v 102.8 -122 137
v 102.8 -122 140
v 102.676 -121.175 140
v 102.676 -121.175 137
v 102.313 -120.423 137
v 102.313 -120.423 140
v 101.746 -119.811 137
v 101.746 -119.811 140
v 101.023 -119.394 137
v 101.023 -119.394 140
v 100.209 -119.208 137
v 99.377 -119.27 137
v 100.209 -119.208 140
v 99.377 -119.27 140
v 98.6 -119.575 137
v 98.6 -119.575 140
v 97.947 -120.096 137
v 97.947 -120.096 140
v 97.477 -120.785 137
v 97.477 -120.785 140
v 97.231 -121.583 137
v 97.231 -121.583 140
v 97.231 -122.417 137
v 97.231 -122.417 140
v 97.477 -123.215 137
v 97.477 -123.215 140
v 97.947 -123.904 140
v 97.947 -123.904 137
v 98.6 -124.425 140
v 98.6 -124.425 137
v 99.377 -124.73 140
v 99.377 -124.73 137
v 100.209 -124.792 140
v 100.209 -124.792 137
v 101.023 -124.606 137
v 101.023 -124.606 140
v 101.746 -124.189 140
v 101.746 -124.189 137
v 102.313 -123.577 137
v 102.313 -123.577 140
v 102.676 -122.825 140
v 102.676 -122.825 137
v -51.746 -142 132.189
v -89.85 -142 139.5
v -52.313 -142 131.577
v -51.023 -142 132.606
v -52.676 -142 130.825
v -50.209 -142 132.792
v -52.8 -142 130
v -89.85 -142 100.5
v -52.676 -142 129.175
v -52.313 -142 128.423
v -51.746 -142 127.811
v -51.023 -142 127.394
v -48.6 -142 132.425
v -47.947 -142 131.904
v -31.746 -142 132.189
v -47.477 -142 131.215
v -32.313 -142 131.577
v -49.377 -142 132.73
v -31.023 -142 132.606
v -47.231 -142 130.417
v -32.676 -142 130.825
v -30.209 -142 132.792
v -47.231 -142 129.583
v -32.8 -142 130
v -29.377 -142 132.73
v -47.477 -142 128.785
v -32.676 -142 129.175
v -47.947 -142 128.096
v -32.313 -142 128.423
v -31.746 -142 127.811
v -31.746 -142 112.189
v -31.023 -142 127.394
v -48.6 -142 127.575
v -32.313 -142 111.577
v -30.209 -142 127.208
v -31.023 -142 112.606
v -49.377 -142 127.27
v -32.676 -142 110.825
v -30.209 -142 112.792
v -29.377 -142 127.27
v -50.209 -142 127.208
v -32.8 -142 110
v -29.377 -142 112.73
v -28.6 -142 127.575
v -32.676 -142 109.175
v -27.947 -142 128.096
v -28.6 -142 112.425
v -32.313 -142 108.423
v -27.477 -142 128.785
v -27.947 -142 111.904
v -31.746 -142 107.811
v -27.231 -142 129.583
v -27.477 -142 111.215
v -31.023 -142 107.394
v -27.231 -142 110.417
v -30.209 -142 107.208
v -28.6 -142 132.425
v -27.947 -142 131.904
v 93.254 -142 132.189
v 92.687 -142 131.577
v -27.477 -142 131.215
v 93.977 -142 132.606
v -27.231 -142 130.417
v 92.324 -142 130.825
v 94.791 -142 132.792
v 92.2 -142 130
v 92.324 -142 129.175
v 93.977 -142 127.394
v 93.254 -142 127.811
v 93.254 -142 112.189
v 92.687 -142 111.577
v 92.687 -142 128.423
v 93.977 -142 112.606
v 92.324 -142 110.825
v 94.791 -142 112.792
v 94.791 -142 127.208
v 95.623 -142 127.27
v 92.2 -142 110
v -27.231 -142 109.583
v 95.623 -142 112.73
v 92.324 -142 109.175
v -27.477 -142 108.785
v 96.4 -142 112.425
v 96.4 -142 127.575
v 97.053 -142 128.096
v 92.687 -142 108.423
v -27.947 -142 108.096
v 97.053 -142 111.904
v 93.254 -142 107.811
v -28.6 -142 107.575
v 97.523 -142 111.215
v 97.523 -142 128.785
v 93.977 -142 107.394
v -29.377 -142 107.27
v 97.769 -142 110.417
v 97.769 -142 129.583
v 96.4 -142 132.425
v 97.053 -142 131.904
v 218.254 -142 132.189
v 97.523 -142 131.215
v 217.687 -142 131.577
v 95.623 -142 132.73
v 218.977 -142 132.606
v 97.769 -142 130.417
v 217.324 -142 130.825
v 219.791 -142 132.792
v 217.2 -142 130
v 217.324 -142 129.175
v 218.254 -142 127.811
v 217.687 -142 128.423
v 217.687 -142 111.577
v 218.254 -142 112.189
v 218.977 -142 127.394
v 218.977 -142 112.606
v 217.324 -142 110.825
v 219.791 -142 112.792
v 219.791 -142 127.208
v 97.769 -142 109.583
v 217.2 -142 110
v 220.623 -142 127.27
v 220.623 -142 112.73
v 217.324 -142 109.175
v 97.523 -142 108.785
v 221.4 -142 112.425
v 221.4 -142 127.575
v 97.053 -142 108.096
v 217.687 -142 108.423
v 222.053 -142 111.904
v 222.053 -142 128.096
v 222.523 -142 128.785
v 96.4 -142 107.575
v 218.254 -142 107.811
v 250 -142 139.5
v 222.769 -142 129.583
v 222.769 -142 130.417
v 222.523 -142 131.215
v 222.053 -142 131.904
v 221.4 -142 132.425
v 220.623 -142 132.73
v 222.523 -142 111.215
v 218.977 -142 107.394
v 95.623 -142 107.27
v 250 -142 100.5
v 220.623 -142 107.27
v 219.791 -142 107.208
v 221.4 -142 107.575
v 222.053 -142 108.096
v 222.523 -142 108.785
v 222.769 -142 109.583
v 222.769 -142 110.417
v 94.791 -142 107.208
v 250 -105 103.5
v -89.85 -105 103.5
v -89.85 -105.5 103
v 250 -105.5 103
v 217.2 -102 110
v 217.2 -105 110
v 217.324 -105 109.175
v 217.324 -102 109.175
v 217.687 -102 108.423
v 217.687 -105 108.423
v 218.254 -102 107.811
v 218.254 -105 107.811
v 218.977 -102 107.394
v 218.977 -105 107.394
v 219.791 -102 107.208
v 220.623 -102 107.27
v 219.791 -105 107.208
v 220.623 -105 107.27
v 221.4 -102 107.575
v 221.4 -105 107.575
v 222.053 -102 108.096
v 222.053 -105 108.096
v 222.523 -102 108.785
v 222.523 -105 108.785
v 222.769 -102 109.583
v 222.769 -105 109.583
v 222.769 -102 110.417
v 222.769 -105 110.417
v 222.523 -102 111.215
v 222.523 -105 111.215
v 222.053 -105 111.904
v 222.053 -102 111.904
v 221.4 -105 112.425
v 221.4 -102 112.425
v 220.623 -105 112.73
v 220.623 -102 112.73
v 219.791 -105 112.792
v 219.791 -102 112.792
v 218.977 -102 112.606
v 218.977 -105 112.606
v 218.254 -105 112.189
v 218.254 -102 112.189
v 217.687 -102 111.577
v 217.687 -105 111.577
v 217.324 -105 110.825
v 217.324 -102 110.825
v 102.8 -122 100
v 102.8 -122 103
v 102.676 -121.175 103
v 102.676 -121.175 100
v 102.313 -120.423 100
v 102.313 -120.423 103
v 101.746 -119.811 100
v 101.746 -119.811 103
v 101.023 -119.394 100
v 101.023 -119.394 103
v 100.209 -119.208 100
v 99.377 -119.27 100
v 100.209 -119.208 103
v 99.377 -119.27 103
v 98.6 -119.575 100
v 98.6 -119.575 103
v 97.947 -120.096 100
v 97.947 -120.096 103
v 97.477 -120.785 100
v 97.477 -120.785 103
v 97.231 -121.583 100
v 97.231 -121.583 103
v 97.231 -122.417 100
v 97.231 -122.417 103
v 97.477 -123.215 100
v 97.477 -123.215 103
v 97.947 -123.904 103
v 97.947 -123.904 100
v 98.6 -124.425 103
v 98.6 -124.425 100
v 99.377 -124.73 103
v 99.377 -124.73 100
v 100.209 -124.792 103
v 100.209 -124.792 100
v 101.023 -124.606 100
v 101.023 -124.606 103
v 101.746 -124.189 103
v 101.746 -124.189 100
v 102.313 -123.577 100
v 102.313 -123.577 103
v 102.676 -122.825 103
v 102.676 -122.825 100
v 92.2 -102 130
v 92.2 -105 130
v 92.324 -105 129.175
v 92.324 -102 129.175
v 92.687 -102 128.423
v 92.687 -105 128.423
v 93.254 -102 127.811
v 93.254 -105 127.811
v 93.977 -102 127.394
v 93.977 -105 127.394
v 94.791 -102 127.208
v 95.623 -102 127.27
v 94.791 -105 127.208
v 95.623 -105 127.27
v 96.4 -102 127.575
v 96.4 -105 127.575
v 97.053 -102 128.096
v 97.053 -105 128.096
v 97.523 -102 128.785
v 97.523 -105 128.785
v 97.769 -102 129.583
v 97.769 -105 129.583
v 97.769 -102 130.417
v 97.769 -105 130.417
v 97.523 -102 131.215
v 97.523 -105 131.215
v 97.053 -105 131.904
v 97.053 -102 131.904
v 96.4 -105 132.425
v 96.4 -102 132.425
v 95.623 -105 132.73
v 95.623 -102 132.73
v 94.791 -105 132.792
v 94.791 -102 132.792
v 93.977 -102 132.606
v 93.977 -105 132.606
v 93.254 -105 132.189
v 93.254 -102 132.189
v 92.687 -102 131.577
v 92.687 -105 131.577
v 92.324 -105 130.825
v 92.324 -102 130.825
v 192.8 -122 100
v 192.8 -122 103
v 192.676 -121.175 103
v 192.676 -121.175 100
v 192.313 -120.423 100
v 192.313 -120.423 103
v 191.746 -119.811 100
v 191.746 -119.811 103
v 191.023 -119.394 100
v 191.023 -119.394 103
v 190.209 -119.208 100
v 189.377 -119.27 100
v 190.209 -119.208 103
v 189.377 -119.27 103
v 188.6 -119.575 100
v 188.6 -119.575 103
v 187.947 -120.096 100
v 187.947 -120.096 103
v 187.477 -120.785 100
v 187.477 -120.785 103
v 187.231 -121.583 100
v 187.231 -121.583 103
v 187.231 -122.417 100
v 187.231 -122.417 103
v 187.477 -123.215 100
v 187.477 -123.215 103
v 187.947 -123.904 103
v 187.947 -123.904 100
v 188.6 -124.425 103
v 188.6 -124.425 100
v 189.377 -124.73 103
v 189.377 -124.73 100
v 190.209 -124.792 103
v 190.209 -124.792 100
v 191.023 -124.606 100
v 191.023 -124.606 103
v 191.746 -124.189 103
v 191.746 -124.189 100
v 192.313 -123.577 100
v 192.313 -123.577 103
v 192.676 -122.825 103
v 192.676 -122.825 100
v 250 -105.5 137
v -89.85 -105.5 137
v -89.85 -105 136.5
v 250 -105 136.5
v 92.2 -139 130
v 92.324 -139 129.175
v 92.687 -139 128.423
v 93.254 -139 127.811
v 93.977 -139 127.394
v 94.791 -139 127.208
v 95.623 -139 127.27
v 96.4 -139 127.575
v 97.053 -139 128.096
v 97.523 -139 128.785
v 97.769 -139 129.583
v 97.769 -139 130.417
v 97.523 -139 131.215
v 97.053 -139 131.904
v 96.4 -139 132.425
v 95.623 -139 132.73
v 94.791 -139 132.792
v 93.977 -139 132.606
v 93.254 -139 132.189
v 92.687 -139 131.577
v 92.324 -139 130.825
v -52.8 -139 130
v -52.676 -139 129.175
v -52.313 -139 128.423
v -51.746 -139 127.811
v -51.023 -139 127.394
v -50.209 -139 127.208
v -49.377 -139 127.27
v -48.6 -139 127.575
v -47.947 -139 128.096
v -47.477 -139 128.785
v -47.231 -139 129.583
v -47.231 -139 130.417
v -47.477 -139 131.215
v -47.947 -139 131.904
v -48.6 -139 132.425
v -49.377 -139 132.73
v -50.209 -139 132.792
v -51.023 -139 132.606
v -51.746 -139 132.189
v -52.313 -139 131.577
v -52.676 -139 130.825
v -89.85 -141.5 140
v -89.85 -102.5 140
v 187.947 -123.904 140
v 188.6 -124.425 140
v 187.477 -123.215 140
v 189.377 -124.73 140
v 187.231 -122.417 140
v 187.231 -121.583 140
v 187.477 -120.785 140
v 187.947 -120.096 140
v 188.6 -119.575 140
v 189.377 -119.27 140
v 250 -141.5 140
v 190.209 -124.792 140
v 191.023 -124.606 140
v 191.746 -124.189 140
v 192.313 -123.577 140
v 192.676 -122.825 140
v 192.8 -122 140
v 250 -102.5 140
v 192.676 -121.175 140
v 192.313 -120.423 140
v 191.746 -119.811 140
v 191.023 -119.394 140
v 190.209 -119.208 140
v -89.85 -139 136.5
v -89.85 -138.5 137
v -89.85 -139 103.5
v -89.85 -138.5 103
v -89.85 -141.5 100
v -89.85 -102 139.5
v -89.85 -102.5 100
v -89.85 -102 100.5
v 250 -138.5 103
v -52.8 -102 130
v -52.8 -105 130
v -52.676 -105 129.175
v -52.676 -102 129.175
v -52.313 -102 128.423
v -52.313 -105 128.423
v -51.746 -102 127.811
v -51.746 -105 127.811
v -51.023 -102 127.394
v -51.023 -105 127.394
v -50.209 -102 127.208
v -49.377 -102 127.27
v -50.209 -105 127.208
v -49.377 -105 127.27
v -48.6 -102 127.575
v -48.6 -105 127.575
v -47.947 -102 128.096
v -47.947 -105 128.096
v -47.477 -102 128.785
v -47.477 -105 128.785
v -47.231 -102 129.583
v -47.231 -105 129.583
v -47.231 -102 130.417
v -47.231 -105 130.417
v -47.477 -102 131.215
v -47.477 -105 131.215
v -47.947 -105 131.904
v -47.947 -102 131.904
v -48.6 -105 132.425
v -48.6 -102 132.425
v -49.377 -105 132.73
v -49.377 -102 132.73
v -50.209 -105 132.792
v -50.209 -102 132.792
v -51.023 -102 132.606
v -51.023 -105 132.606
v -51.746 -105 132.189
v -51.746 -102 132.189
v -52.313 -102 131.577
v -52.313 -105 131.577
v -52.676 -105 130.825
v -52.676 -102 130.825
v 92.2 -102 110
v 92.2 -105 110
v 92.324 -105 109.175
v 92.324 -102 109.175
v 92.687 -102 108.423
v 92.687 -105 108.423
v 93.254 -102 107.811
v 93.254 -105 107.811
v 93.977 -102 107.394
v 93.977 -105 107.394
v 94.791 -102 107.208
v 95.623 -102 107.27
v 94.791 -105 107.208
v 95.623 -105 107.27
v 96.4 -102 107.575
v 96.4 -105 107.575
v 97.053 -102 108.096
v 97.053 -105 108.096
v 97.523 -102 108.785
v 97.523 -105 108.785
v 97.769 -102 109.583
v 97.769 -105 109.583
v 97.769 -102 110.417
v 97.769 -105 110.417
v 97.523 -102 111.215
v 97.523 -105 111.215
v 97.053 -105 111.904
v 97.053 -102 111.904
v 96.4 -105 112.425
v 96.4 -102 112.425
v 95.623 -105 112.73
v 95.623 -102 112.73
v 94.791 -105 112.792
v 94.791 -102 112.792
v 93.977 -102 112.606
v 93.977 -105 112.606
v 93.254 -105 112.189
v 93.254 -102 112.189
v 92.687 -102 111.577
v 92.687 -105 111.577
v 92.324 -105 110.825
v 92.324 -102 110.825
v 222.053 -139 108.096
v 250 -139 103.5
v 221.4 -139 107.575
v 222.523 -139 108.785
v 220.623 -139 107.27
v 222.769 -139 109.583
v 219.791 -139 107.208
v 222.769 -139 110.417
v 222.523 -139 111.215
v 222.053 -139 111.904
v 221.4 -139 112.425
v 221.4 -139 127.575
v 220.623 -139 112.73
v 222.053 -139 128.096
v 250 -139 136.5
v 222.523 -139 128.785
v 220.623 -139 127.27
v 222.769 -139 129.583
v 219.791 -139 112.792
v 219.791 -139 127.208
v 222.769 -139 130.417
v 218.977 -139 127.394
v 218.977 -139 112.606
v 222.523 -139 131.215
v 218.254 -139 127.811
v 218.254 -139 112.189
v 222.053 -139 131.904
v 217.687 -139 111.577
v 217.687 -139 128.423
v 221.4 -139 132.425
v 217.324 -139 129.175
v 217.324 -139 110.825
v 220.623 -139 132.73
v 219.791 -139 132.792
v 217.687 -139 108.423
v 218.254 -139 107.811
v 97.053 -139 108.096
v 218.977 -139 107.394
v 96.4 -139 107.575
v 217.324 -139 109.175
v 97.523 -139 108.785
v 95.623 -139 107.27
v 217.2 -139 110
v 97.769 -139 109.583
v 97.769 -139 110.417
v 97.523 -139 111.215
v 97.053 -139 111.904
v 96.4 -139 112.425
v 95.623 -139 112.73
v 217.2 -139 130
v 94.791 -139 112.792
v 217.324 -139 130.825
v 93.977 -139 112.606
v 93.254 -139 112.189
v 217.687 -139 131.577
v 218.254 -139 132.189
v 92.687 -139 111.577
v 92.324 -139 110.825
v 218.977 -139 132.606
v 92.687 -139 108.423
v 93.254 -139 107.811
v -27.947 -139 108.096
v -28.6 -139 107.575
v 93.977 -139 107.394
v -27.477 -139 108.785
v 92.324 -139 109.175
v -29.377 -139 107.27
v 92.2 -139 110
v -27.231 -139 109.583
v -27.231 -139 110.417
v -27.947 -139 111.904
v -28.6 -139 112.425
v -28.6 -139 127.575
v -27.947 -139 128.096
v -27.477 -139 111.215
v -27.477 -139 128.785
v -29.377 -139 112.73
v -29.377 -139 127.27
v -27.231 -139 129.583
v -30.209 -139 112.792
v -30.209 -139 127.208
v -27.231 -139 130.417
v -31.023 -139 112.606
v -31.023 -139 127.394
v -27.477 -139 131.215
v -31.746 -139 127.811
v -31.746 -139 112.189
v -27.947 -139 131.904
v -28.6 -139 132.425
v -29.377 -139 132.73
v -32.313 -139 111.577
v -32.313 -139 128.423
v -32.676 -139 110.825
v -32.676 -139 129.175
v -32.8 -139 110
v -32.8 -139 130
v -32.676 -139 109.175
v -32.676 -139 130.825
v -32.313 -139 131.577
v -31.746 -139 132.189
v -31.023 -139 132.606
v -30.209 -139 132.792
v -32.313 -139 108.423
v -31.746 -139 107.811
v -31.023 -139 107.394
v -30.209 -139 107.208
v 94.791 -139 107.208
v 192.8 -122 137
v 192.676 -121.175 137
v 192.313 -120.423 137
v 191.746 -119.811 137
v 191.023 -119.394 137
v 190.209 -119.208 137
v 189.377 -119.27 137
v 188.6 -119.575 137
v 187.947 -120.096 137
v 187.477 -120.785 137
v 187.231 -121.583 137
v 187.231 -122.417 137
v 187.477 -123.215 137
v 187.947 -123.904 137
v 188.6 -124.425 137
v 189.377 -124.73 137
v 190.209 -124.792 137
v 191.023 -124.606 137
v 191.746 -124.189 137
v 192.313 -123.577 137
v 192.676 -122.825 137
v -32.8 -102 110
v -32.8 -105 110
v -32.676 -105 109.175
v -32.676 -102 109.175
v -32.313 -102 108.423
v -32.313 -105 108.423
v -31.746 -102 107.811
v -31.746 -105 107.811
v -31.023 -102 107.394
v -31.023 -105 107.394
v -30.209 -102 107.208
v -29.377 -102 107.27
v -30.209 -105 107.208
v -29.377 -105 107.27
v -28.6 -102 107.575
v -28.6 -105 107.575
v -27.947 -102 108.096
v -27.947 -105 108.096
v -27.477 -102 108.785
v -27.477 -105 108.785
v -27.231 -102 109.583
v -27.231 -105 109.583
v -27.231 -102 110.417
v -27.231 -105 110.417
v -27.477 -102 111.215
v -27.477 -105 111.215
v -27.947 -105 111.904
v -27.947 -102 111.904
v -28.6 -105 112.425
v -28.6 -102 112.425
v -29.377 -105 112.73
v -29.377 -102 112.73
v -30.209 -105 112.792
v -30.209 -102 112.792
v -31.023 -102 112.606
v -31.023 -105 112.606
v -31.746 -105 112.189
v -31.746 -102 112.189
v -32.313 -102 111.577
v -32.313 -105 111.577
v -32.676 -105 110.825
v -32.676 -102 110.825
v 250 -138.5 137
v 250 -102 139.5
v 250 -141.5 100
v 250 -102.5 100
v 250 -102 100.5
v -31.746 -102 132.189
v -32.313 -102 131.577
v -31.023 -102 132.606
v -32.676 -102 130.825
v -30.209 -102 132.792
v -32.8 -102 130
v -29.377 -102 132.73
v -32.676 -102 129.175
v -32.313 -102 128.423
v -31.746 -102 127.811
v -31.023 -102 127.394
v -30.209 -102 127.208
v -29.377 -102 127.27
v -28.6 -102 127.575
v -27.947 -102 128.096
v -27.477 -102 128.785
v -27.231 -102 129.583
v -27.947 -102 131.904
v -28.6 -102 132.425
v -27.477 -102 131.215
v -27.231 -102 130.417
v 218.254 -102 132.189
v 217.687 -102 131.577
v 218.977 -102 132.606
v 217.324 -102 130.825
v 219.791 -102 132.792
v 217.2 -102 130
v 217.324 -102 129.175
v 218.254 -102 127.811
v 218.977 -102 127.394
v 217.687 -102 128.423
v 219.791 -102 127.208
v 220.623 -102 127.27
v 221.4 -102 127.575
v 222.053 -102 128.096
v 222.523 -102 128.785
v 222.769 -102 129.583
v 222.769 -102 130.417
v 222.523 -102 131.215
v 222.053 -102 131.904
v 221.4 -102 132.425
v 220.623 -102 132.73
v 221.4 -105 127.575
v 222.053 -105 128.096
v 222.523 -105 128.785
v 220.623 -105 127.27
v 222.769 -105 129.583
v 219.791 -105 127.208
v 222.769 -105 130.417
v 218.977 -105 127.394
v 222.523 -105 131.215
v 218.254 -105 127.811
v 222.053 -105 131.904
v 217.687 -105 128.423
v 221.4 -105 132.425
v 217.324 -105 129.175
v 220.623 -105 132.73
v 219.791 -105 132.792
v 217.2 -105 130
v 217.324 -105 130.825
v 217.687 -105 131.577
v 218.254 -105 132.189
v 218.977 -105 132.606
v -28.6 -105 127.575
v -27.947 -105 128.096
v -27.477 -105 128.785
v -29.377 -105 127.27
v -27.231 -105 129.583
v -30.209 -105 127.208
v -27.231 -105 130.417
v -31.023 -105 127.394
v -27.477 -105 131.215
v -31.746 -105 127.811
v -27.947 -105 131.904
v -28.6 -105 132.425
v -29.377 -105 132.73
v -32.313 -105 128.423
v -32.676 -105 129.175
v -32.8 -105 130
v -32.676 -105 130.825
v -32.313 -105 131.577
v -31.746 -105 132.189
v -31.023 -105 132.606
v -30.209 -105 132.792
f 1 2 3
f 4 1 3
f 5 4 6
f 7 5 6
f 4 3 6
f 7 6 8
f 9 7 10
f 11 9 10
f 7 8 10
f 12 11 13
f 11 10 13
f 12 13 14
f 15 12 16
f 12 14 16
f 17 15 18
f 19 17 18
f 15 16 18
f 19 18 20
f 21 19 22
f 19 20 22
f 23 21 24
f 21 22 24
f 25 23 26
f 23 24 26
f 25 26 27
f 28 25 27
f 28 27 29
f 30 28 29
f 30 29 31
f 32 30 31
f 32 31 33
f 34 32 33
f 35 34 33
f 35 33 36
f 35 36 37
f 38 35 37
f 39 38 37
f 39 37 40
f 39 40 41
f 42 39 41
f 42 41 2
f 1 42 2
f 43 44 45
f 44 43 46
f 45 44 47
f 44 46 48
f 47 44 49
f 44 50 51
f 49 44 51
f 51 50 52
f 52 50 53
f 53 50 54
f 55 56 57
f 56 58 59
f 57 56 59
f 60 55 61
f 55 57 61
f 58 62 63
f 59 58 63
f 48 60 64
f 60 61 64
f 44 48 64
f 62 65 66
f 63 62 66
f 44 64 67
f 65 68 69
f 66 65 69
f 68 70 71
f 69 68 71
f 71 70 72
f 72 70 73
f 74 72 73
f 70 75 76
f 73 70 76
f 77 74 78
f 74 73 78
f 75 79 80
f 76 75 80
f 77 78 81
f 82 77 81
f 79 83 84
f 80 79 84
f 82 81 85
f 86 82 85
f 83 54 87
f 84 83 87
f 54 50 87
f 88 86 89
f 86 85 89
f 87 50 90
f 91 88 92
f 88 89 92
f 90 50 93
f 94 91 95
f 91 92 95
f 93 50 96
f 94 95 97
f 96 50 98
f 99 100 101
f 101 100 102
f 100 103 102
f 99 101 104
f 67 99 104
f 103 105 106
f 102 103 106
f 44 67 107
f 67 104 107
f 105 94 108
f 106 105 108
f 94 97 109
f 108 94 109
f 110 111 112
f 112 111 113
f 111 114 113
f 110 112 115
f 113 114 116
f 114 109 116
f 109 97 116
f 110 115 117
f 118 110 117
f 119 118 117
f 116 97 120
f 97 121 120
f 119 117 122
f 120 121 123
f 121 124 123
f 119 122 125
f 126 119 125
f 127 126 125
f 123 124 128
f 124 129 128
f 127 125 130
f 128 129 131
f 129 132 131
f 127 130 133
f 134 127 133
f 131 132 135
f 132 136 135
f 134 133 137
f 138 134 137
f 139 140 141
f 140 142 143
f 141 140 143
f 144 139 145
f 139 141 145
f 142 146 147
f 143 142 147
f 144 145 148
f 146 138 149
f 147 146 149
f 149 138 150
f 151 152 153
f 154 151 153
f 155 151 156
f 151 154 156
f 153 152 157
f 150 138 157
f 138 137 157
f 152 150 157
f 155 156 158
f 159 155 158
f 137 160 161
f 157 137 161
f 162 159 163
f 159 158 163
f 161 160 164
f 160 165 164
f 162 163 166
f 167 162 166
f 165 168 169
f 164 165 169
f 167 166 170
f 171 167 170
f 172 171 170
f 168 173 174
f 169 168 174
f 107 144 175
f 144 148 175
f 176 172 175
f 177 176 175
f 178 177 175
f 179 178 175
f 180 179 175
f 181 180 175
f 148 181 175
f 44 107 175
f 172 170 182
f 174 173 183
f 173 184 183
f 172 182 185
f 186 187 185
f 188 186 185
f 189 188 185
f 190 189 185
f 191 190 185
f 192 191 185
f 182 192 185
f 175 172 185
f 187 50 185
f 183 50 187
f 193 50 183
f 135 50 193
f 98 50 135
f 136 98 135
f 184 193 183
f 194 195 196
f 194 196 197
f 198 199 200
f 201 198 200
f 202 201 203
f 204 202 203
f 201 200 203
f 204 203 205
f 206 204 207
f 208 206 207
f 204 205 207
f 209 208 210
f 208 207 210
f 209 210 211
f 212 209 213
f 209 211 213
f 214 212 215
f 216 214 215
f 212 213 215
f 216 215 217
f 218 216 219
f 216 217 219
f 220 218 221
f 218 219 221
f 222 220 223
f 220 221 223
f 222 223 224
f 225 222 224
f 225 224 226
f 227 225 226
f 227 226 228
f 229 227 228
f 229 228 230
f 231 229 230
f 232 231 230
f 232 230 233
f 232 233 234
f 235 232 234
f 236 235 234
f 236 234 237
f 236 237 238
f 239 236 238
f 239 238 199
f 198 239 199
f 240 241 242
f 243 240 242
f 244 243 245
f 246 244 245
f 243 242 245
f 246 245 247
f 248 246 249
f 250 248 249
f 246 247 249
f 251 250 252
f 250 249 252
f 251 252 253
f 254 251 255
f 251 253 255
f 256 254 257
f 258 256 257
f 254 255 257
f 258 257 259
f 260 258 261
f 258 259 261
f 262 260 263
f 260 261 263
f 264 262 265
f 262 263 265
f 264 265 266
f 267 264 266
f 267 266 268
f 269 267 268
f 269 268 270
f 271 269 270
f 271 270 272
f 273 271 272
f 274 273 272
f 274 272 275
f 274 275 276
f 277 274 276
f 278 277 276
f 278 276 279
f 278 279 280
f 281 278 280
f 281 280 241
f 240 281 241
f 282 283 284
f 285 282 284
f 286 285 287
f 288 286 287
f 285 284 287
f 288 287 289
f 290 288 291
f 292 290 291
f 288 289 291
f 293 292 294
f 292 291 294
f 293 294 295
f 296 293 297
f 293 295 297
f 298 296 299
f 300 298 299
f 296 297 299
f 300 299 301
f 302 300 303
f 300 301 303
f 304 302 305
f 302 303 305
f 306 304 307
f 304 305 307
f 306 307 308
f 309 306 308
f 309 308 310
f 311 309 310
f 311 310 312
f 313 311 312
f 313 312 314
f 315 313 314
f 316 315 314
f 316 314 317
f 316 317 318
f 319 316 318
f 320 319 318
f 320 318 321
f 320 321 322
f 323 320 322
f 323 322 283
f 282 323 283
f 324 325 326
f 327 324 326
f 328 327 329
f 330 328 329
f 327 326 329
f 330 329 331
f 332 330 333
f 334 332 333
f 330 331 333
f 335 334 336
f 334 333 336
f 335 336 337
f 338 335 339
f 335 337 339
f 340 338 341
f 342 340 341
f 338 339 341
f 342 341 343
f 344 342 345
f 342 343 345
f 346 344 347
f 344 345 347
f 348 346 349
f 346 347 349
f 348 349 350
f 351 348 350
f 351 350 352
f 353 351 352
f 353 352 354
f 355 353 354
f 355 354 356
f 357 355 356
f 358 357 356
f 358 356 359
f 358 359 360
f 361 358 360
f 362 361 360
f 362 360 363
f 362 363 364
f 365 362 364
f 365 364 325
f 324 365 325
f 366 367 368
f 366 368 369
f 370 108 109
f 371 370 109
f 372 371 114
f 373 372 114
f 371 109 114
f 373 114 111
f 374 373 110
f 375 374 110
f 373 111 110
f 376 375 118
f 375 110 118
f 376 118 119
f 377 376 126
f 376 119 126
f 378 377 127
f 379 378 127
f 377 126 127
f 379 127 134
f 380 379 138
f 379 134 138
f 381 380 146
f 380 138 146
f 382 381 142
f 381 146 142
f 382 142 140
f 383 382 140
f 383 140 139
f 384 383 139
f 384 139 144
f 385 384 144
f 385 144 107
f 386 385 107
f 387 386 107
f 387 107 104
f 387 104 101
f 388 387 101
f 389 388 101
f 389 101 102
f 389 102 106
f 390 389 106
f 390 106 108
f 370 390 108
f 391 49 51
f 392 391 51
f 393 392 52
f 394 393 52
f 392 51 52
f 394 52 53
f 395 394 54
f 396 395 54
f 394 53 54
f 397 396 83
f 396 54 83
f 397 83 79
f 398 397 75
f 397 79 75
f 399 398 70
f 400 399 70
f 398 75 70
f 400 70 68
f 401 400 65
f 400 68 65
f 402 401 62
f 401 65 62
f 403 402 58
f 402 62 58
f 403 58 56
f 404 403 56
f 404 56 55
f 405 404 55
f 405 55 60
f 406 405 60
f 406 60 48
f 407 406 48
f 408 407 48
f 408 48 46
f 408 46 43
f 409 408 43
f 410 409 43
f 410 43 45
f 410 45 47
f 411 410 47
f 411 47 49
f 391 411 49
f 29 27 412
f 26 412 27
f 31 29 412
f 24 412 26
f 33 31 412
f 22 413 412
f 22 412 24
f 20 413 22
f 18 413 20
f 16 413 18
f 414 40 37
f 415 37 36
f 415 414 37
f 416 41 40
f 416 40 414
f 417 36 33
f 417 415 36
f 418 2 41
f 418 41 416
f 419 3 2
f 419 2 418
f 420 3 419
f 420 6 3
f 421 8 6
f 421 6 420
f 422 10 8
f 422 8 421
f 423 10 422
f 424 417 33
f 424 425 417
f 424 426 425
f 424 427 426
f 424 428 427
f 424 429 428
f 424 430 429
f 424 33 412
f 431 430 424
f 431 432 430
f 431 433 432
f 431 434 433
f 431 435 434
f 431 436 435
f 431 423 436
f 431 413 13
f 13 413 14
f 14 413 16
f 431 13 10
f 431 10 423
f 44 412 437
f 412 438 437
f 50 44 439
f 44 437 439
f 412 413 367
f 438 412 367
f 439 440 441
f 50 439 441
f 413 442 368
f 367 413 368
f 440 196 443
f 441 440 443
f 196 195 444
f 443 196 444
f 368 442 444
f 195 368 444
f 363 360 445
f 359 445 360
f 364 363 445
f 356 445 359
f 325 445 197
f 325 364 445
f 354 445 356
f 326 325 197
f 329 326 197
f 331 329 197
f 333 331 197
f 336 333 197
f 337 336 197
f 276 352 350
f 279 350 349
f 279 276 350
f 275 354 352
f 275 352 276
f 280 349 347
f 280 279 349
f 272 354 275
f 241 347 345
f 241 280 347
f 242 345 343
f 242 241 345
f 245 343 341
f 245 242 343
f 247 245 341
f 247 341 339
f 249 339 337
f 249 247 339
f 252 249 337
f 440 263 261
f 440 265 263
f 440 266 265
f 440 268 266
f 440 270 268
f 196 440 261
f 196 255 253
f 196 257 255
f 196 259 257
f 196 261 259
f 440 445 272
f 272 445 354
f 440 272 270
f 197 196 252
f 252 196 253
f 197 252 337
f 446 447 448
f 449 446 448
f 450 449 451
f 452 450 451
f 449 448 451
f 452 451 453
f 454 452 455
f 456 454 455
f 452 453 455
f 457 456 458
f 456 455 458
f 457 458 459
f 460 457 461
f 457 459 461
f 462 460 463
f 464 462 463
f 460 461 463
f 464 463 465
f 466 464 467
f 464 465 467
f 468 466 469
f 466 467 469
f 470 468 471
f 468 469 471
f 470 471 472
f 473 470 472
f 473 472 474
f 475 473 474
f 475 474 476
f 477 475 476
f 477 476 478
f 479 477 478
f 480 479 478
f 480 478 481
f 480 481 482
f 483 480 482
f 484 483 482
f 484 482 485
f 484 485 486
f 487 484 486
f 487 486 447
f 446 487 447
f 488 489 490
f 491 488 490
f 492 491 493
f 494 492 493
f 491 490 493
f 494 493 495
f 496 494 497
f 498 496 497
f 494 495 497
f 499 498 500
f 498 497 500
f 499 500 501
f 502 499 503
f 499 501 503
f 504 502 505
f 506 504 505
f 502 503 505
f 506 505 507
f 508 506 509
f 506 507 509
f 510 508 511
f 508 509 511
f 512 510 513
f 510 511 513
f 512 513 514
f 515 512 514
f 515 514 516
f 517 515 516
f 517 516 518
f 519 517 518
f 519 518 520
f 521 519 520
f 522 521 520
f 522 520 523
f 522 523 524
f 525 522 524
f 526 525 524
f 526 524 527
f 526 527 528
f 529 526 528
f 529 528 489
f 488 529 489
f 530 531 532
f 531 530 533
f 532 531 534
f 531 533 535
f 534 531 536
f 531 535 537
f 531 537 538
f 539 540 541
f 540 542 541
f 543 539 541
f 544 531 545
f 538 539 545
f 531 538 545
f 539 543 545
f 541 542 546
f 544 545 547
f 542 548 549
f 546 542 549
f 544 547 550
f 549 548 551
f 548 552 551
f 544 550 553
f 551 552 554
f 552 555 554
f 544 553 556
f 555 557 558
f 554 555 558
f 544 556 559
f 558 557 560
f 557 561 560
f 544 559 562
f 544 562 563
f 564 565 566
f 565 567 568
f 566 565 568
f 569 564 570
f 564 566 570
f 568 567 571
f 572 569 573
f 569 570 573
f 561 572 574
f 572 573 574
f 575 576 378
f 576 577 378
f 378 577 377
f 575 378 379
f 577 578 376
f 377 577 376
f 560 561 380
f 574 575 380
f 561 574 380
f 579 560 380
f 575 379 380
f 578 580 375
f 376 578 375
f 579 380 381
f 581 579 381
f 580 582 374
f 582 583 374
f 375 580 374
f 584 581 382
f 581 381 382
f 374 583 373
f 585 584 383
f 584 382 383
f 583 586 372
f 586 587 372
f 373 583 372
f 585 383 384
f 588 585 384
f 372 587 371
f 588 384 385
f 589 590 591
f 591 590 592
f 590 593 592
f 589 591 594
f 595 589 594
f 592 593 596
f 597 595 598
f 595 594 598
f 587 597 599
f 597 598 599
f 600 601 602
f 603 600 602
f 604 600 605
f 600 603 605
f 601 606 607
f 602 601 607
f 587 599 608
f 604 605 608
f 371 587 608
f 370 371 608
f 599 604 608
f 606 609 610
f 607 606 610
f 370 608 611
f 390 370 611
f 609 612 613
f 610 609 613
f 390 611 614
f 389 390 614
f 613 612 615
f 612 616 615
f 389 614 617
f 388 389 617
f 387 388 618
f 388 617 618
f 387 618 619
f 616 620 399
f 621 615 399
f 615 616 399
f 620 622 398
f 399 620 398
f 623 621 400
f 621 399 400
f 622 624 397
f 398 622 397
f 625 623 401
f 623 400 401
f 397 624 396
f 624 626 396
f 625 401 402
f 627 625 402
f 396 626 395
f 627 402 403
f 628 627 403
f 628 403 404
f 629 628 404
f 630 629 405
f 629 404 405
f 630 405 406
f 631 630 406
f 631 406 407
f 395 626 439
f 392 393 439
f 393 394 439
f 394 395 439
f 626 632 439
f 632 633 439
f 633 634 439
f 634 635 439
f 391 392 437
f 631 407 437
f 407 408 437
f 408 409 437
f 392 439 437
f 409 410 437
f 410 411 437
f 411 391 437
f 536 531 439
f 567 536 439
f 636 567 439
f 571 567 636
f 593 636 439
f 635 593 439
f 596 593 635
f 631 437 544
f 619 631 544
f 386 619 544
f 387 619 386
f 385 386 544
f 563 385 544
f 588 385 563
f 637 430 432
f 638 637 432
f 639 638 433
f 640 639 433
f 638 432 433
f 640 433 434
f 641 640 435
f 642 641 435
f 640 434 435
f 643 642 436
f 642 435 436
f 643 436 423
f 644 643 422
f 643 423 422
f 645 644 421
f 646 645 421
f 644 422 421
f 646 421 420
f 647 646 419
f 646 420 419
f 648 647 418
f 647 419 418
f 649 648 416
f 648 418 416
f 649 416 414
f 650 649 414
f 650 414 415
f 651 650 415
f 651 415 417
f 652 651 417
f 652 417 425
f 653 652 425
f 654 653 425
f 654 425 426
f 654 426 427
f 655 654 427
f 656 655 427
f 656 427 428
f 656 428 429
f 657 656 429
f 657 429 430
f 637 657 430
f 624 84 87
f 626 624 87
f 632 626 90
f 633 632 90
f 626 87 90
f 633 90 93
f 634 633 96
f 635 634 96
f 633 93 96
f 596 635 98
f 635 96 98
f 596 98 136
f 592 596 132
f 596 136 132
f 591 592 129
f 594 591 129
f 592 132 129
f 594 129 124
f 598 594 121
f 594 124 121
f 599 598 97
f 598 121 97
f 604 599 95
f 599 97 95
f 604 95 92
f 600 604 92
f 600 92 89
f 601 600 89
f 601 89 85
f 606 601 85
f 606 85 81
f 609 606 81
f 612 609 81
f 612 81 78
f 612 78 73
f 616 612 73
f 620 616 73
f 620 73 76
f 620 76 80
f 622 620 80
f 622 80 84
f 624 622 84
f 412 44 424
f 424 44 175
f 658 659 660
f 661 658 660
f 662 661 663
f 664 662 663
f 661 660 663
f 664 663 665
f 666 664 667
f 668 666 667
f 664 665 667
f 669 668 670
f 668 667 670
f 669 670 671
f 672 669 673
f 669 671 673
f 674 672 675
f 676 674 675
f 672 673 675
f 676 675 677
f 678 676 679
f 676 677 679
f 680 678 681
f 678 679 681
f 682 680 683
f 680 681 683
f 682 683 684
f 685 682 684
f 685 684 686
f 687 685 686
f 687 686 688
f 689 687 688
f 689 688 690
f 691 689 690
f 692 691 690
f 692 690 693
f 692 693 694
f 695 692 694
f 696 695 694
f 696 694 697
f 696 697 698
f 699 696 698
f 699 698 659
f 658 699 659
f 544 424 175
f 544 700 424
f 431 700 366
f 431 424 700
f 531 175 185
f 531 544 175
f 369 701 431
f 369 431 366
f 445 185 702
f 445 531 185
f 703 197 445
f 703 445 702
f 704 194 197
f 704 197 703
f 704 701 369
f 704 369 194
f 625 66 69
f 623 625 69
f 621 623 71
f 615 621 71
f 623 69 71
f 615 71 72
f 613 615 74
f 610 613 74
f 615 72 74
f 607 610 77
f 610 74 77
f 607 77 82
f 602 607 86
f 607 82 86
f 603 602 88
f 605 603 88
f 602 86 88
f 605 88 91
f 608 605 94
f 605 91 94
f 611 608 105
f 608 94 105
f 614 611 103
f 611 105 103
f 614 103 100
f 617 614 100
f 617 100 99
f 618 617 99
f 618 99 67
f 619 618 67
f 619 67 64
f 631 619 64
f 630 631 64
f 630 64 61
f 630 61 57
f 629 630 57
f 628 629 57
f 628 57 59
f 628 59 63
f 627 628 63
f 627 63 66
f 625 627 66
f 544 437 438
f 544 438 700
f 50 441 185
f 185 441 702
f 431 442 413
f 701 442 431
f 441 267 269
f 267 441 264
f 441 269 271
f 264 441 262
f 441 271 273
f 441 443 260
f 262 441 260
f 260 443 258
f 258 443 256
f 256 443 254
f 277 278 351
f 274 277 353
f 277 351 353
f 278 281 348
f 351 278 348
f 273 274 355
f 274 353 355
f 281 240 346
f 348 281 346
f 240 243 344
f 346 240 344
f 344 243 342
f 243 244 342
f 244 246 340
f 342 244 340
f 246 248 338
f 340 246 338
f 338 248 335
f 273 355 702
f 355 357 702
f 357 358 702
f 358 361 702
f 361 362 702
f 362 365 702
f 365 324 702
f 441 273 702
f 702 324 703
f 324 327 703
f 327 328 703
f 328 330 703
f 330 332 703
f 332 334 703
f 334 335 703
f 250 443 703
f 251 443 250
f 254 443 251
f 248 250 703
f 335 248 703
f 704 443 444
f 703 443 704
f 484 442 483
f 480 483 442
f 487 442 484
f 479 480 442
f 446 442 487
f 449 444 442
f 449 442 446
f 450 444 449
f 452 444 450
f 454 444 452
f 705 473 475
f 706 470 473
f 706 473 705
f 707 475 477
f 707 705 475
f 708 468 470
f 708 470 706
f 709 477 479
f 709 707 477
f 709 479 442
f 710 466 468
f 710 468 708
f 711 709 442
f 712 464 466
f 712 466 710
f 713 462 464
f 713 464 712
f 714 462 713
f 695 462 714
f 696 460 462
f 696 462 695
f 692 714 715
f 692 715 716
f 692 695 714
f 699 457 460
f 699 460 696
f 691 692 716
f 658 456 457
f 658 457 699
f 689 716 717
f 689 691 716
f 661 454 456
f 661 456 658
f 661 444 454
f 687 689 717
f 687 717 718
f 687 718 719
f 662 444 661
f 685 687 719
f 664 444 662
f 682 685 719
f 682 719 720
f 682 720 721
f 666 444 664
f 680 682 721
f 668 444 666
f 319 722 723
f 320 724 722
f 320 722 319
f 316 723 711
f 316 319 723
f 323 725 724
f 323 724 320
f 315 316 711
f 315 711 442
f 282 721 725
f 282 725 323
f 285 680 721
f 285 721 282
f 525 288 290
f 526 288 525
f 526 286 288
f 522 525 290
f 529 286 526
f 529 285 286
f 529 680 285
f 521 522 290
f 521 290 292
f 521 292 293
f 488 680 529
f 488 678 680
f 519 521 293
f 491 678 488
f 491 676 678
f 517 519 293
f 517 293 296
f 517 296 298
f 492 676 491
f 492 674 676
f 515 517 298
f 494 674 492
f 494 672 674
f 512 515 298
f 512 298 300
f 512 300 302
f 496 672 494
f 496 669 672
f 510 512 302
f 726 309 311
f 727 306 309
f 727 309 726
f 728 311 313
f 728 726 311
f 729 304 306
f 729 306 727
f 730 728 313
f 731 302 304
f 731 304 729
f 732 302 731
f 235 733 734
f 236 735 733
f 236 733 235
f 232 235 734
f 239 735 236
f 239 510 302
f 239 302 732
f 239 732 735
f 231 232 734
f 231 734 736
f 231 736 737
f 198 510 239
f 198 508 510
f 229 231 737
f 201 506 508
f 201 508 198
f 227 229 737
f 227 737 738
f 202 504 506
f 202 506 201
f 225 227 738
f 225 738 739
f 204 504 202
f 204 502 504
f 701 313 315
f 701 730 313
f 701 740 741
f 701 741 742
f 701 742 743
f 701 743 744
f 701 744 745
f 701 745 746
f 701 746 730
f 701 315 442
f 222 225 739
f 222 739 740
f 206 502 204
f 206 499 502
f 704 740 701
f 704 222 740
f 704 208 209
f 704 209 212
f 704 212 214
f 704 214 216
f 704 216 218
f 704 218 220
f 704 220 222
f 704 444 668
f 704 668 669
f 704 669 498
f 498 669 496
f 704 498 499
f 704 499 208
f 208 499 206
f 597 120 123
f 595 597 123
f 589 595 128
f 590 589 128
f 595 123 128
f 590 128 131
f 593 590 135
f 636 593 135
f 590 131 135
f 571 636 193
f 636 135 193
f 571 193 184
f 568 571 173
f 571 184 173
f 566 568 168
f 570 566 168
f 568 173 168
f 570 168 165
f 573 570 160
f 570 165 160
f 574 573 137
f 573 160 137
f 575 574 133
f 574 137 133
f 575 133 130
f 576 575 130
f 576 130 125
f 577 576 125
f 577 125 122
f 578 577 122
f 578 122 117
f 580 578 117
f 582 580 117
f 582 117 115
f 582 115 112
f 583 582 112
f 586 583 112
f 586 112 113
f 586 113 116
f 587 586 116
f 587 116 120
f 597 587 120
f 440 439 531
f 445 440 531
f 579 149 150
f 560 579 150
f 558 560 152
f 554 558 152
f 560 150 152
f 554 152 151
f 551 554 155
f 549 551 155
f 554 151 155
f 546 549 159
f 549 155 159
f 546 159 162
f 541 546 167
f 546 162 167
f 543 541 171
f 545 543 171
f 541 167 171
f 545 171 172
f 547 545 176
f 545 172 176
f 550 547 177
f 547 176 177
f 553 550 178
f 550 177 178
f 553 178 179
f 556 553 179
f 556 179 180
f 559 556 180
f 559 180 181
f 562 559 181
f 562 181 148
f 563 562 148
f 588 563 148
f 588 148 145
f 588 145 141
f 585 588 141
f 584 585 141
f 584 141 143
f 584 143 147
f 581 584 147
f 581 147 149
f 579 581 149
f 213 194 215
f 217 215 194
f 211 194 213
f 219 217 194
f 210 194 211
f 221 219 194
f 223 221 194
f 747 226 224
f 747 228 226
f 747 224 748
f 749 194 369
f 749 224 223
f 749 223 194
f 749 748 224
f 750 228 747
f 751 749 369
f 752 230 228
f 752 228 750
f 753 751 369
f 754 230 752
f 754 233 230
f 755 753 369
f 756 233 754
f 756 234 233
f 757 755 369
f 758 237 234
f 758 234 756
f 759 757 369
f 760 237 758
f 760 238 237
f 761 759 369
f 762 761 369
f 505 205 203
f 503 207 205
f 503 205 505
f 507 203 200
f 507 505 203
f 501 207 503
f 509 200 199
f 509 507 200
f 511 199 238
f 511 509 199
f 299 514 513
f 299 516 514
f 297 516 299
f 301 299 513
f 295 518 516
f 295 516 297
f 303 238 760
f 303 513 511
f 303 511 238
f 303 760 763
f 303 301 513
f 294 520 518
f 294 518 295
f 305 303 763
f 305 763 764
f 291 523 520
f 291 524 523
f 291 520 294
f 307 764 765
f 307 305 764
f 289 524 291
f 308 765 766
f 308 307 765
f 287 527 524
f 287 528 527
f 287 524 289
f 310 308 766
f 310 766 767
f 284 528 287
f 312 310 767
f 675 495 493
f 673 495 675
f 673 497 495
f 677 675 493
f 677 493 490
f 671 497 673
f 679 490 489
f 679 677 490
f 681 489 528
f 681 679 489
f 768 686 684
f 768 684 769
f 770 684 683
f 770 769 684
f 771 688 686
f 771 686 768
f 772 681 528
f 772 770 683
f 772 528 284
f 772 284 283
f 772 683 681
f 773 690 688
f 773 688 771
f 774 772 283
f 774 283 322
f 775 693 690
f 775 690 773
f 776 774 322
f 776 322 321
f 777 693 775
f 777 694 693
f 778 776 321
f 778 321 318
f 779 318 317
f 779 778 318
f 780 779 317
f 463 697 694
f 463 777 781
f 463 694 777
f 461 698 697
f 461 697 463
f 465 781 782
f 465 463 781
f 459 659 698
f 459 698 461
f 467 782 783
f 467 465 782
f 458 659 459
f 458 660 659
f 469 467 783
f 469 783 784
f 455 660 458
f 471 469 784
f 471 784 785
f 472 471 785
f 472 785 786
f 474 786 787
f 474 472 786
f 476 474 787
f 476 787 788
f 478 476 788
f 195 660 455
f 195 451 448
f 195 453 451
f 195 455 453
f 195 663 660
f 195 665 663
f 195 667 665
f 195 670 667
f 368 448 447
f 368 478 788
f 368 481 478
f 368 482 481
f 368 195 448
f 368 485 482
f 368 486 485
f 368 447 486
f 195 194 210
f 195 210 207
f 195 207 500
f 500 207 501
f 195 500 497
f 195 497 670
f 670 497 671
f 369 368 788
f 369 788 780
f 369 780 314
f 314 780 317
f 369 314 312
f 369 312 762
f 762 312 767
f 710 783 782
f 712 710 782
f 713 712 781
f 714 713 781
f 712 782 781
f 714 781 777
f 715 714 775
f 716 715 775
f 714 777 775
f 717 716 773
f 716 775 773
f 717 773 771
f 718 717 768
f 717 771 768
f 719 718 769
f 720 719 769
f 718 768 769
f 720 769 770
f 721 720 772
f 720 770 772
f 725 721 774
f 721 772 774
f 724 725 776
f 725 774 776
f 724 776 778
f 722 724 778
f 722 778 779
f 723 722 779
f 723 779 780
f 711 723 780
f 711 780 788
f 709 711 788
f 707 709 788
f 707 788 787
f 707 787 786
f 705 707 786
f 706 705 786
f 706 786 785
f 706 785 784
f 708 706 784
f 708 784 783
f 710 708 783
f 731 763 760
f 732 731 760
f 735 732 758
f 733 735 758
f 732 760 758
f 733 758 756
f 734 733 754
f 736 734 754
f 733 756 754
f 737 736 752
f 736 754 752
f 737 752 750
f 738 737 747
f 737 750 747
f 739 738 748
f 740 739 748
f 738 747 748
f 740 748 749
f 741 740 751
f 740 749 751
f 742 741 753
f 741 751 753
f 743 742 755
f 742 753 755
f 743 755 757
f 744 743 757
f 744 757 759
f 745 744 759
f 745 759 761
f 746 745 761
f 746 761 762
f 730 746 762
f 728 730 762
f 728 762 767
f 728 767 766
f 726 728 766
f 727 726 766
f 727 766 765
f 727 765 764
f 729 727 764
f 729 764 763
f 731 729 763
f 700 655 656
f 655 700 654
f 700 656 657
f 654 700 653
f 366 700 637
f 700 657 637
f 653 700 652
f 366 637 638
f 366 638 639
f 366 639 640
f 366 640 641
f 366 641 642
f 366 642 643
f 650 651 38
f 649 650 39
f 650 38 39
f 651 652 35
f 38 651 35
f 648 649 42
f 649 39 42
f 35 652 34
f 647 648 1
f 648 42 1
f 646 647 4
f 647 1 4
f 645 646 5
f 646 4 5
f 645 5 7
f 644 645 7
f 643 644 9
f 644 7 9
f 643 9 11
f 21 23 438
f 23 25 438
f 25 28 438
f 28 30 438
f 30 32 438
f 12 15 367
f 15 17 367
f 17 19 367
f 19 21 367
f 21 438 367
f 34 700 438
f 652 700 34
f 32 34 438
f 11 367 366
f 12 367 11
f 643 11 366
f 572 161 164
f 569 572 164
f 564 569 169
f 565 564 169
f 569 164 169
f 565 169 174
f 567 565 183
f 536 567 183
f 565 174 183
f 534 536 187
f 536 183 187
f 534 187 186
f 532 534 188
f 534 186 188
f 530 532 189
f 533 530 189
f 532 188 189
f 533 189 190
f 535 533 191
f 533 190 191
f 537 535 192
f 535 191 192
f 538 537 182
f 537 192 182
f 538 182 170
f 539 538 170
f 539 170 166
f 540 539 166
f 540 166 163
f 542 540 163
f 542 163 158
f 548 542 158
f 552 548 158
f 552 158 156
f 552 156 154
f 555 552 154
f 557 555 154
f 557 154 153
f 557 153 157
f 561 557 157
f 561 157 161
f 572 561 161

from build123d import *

# Parameters (mm, degrees)
SKETCH1_W                      = 339.85
SKETCH1_H                      = 40
BOSS_EXTRUDE1_DEPTH            = 40
SKETCH2_W                      = 34
SKETCH2_H                      = 34
CUT_EXTRUDE1_DEPTH             = 395.033022093
F_5_6_5_6_DIAMETER_HOLE1_D     = 5.6
F_5_6_5_6_DIAMETER_HOLE1_DEPTH = 3
F_5_6_5_6_DIAMETER_HOLE2_D     = 5.6
F_5_6_5_6_DIAMETER_HOLE2_DEPTH = 3
F_5_6_5_6_DIAMETER_HOLE3_D     = 5.6
F_5_6_5_6_DIAMETER_HOLE4_D     = 5.6
F_5_6_5_6_DIAMETER_HOLE4_DEPTH = 40
CHAMFER1_SIZE                  = 0.5


with BuildPart() as part:
    # Sketch1 → Boss-Extrude1 (new body)
    with BuildSketch(Plane(origin=(0, -102, 0), x_dir=(1, 0, 0), z_dir=(0, 1, 0))):
        with Locations((80.075, -120)):
            Rectangle(SKETCH1_W, SKETCH1_H)
    extrude(amount=-BOSS_EXTRUDE1_DEPTH)

    # Sketch2 → Cut-Extrude1 (cut, through all)
    with BuildSketch(Plane.ZY.offset(89.85)):
        with Locations((120, -122)):
            Rectangle(SKETCH2_W, SKETCH2_H)
    extrude(amount=-CUT_EXTRUDE1_DEPTH, mode=Mode.SUBTRACT)

    # Ø5.6 (5.6) Diameter Hole1
    with Locations(Plane(origin=(0, -139, 0), x_dir=(1, 0, 0), z_dir=(0, 1, 0))):
        with Locations((220, -130), (95, -130), (220, -110), (95, -110), (-30, -130), (-50, -130), (-30, -110)):
            Hole(F_5_6_5_6_DIAMETER_HOLE1_D / 2, depth=F_5_6_5_6_DIAMETER_HOLE1_DEPTH)

    # Ø5.6 (5.6) Diameter Hole2
    with Locations(Plane(origin=(0, 0, 100), x_dir=(-1, 0, 0), z_dir=(0, 0, -1))):
        with Locations((-190, -122), (-100, -122)):
            Hole(F_5_6_5_6_DIAMETER_HOLE2_D / 2, depth=F_5_6_5_6_DIAMETER_HOLE2_DEPTH)

    # Ø5.6 (5.6) Diameter Hole3 (through all)
    with Locations(Plane(origin=(0, 0, 137), x_dir=(-1, 0, 0), z_dir=(0, 0, -1))):
        with Locations((-190, -122), (-100, -122)):
            Hole(F_5_6_5_6_DIAMETER_HOLE3_D / 2)

    # Ø5.6 (5.6) Diameter Hole4
    with Locations(Plane(origin=(0, -102, 0), x_dir=(1, 0, 0), z_dir=(0, 1, 0))):
        with Locations((220, -130), (95, -130), (220, -110), (95, -110), (-30, -130), (-50, -130), (-30, -110)):
            Hole(F_5_6_5_6_DIAMETER_HOLE4_D / 2, depth=F_5_6_5_6_DIAMETER_HOLE4_DEPTH)

    # Chamfer1
    chamfer1_edges = [part.edges().sort_by_distance(p)[0] for p in [
        (80.075, -142, 100),
        (80.075, -139, 103),
        (80.075, -105, 103),
        (80.075, -105, 137),
        (80.075, -139, 137),
        (80.075, -142, 140),
        (80.075, -102, 100),
        (80.075, -102, 140),
    ]]
    chamfer(chamfer1_edges, length=CHAMFER1_SIZE)


solid = part.part
